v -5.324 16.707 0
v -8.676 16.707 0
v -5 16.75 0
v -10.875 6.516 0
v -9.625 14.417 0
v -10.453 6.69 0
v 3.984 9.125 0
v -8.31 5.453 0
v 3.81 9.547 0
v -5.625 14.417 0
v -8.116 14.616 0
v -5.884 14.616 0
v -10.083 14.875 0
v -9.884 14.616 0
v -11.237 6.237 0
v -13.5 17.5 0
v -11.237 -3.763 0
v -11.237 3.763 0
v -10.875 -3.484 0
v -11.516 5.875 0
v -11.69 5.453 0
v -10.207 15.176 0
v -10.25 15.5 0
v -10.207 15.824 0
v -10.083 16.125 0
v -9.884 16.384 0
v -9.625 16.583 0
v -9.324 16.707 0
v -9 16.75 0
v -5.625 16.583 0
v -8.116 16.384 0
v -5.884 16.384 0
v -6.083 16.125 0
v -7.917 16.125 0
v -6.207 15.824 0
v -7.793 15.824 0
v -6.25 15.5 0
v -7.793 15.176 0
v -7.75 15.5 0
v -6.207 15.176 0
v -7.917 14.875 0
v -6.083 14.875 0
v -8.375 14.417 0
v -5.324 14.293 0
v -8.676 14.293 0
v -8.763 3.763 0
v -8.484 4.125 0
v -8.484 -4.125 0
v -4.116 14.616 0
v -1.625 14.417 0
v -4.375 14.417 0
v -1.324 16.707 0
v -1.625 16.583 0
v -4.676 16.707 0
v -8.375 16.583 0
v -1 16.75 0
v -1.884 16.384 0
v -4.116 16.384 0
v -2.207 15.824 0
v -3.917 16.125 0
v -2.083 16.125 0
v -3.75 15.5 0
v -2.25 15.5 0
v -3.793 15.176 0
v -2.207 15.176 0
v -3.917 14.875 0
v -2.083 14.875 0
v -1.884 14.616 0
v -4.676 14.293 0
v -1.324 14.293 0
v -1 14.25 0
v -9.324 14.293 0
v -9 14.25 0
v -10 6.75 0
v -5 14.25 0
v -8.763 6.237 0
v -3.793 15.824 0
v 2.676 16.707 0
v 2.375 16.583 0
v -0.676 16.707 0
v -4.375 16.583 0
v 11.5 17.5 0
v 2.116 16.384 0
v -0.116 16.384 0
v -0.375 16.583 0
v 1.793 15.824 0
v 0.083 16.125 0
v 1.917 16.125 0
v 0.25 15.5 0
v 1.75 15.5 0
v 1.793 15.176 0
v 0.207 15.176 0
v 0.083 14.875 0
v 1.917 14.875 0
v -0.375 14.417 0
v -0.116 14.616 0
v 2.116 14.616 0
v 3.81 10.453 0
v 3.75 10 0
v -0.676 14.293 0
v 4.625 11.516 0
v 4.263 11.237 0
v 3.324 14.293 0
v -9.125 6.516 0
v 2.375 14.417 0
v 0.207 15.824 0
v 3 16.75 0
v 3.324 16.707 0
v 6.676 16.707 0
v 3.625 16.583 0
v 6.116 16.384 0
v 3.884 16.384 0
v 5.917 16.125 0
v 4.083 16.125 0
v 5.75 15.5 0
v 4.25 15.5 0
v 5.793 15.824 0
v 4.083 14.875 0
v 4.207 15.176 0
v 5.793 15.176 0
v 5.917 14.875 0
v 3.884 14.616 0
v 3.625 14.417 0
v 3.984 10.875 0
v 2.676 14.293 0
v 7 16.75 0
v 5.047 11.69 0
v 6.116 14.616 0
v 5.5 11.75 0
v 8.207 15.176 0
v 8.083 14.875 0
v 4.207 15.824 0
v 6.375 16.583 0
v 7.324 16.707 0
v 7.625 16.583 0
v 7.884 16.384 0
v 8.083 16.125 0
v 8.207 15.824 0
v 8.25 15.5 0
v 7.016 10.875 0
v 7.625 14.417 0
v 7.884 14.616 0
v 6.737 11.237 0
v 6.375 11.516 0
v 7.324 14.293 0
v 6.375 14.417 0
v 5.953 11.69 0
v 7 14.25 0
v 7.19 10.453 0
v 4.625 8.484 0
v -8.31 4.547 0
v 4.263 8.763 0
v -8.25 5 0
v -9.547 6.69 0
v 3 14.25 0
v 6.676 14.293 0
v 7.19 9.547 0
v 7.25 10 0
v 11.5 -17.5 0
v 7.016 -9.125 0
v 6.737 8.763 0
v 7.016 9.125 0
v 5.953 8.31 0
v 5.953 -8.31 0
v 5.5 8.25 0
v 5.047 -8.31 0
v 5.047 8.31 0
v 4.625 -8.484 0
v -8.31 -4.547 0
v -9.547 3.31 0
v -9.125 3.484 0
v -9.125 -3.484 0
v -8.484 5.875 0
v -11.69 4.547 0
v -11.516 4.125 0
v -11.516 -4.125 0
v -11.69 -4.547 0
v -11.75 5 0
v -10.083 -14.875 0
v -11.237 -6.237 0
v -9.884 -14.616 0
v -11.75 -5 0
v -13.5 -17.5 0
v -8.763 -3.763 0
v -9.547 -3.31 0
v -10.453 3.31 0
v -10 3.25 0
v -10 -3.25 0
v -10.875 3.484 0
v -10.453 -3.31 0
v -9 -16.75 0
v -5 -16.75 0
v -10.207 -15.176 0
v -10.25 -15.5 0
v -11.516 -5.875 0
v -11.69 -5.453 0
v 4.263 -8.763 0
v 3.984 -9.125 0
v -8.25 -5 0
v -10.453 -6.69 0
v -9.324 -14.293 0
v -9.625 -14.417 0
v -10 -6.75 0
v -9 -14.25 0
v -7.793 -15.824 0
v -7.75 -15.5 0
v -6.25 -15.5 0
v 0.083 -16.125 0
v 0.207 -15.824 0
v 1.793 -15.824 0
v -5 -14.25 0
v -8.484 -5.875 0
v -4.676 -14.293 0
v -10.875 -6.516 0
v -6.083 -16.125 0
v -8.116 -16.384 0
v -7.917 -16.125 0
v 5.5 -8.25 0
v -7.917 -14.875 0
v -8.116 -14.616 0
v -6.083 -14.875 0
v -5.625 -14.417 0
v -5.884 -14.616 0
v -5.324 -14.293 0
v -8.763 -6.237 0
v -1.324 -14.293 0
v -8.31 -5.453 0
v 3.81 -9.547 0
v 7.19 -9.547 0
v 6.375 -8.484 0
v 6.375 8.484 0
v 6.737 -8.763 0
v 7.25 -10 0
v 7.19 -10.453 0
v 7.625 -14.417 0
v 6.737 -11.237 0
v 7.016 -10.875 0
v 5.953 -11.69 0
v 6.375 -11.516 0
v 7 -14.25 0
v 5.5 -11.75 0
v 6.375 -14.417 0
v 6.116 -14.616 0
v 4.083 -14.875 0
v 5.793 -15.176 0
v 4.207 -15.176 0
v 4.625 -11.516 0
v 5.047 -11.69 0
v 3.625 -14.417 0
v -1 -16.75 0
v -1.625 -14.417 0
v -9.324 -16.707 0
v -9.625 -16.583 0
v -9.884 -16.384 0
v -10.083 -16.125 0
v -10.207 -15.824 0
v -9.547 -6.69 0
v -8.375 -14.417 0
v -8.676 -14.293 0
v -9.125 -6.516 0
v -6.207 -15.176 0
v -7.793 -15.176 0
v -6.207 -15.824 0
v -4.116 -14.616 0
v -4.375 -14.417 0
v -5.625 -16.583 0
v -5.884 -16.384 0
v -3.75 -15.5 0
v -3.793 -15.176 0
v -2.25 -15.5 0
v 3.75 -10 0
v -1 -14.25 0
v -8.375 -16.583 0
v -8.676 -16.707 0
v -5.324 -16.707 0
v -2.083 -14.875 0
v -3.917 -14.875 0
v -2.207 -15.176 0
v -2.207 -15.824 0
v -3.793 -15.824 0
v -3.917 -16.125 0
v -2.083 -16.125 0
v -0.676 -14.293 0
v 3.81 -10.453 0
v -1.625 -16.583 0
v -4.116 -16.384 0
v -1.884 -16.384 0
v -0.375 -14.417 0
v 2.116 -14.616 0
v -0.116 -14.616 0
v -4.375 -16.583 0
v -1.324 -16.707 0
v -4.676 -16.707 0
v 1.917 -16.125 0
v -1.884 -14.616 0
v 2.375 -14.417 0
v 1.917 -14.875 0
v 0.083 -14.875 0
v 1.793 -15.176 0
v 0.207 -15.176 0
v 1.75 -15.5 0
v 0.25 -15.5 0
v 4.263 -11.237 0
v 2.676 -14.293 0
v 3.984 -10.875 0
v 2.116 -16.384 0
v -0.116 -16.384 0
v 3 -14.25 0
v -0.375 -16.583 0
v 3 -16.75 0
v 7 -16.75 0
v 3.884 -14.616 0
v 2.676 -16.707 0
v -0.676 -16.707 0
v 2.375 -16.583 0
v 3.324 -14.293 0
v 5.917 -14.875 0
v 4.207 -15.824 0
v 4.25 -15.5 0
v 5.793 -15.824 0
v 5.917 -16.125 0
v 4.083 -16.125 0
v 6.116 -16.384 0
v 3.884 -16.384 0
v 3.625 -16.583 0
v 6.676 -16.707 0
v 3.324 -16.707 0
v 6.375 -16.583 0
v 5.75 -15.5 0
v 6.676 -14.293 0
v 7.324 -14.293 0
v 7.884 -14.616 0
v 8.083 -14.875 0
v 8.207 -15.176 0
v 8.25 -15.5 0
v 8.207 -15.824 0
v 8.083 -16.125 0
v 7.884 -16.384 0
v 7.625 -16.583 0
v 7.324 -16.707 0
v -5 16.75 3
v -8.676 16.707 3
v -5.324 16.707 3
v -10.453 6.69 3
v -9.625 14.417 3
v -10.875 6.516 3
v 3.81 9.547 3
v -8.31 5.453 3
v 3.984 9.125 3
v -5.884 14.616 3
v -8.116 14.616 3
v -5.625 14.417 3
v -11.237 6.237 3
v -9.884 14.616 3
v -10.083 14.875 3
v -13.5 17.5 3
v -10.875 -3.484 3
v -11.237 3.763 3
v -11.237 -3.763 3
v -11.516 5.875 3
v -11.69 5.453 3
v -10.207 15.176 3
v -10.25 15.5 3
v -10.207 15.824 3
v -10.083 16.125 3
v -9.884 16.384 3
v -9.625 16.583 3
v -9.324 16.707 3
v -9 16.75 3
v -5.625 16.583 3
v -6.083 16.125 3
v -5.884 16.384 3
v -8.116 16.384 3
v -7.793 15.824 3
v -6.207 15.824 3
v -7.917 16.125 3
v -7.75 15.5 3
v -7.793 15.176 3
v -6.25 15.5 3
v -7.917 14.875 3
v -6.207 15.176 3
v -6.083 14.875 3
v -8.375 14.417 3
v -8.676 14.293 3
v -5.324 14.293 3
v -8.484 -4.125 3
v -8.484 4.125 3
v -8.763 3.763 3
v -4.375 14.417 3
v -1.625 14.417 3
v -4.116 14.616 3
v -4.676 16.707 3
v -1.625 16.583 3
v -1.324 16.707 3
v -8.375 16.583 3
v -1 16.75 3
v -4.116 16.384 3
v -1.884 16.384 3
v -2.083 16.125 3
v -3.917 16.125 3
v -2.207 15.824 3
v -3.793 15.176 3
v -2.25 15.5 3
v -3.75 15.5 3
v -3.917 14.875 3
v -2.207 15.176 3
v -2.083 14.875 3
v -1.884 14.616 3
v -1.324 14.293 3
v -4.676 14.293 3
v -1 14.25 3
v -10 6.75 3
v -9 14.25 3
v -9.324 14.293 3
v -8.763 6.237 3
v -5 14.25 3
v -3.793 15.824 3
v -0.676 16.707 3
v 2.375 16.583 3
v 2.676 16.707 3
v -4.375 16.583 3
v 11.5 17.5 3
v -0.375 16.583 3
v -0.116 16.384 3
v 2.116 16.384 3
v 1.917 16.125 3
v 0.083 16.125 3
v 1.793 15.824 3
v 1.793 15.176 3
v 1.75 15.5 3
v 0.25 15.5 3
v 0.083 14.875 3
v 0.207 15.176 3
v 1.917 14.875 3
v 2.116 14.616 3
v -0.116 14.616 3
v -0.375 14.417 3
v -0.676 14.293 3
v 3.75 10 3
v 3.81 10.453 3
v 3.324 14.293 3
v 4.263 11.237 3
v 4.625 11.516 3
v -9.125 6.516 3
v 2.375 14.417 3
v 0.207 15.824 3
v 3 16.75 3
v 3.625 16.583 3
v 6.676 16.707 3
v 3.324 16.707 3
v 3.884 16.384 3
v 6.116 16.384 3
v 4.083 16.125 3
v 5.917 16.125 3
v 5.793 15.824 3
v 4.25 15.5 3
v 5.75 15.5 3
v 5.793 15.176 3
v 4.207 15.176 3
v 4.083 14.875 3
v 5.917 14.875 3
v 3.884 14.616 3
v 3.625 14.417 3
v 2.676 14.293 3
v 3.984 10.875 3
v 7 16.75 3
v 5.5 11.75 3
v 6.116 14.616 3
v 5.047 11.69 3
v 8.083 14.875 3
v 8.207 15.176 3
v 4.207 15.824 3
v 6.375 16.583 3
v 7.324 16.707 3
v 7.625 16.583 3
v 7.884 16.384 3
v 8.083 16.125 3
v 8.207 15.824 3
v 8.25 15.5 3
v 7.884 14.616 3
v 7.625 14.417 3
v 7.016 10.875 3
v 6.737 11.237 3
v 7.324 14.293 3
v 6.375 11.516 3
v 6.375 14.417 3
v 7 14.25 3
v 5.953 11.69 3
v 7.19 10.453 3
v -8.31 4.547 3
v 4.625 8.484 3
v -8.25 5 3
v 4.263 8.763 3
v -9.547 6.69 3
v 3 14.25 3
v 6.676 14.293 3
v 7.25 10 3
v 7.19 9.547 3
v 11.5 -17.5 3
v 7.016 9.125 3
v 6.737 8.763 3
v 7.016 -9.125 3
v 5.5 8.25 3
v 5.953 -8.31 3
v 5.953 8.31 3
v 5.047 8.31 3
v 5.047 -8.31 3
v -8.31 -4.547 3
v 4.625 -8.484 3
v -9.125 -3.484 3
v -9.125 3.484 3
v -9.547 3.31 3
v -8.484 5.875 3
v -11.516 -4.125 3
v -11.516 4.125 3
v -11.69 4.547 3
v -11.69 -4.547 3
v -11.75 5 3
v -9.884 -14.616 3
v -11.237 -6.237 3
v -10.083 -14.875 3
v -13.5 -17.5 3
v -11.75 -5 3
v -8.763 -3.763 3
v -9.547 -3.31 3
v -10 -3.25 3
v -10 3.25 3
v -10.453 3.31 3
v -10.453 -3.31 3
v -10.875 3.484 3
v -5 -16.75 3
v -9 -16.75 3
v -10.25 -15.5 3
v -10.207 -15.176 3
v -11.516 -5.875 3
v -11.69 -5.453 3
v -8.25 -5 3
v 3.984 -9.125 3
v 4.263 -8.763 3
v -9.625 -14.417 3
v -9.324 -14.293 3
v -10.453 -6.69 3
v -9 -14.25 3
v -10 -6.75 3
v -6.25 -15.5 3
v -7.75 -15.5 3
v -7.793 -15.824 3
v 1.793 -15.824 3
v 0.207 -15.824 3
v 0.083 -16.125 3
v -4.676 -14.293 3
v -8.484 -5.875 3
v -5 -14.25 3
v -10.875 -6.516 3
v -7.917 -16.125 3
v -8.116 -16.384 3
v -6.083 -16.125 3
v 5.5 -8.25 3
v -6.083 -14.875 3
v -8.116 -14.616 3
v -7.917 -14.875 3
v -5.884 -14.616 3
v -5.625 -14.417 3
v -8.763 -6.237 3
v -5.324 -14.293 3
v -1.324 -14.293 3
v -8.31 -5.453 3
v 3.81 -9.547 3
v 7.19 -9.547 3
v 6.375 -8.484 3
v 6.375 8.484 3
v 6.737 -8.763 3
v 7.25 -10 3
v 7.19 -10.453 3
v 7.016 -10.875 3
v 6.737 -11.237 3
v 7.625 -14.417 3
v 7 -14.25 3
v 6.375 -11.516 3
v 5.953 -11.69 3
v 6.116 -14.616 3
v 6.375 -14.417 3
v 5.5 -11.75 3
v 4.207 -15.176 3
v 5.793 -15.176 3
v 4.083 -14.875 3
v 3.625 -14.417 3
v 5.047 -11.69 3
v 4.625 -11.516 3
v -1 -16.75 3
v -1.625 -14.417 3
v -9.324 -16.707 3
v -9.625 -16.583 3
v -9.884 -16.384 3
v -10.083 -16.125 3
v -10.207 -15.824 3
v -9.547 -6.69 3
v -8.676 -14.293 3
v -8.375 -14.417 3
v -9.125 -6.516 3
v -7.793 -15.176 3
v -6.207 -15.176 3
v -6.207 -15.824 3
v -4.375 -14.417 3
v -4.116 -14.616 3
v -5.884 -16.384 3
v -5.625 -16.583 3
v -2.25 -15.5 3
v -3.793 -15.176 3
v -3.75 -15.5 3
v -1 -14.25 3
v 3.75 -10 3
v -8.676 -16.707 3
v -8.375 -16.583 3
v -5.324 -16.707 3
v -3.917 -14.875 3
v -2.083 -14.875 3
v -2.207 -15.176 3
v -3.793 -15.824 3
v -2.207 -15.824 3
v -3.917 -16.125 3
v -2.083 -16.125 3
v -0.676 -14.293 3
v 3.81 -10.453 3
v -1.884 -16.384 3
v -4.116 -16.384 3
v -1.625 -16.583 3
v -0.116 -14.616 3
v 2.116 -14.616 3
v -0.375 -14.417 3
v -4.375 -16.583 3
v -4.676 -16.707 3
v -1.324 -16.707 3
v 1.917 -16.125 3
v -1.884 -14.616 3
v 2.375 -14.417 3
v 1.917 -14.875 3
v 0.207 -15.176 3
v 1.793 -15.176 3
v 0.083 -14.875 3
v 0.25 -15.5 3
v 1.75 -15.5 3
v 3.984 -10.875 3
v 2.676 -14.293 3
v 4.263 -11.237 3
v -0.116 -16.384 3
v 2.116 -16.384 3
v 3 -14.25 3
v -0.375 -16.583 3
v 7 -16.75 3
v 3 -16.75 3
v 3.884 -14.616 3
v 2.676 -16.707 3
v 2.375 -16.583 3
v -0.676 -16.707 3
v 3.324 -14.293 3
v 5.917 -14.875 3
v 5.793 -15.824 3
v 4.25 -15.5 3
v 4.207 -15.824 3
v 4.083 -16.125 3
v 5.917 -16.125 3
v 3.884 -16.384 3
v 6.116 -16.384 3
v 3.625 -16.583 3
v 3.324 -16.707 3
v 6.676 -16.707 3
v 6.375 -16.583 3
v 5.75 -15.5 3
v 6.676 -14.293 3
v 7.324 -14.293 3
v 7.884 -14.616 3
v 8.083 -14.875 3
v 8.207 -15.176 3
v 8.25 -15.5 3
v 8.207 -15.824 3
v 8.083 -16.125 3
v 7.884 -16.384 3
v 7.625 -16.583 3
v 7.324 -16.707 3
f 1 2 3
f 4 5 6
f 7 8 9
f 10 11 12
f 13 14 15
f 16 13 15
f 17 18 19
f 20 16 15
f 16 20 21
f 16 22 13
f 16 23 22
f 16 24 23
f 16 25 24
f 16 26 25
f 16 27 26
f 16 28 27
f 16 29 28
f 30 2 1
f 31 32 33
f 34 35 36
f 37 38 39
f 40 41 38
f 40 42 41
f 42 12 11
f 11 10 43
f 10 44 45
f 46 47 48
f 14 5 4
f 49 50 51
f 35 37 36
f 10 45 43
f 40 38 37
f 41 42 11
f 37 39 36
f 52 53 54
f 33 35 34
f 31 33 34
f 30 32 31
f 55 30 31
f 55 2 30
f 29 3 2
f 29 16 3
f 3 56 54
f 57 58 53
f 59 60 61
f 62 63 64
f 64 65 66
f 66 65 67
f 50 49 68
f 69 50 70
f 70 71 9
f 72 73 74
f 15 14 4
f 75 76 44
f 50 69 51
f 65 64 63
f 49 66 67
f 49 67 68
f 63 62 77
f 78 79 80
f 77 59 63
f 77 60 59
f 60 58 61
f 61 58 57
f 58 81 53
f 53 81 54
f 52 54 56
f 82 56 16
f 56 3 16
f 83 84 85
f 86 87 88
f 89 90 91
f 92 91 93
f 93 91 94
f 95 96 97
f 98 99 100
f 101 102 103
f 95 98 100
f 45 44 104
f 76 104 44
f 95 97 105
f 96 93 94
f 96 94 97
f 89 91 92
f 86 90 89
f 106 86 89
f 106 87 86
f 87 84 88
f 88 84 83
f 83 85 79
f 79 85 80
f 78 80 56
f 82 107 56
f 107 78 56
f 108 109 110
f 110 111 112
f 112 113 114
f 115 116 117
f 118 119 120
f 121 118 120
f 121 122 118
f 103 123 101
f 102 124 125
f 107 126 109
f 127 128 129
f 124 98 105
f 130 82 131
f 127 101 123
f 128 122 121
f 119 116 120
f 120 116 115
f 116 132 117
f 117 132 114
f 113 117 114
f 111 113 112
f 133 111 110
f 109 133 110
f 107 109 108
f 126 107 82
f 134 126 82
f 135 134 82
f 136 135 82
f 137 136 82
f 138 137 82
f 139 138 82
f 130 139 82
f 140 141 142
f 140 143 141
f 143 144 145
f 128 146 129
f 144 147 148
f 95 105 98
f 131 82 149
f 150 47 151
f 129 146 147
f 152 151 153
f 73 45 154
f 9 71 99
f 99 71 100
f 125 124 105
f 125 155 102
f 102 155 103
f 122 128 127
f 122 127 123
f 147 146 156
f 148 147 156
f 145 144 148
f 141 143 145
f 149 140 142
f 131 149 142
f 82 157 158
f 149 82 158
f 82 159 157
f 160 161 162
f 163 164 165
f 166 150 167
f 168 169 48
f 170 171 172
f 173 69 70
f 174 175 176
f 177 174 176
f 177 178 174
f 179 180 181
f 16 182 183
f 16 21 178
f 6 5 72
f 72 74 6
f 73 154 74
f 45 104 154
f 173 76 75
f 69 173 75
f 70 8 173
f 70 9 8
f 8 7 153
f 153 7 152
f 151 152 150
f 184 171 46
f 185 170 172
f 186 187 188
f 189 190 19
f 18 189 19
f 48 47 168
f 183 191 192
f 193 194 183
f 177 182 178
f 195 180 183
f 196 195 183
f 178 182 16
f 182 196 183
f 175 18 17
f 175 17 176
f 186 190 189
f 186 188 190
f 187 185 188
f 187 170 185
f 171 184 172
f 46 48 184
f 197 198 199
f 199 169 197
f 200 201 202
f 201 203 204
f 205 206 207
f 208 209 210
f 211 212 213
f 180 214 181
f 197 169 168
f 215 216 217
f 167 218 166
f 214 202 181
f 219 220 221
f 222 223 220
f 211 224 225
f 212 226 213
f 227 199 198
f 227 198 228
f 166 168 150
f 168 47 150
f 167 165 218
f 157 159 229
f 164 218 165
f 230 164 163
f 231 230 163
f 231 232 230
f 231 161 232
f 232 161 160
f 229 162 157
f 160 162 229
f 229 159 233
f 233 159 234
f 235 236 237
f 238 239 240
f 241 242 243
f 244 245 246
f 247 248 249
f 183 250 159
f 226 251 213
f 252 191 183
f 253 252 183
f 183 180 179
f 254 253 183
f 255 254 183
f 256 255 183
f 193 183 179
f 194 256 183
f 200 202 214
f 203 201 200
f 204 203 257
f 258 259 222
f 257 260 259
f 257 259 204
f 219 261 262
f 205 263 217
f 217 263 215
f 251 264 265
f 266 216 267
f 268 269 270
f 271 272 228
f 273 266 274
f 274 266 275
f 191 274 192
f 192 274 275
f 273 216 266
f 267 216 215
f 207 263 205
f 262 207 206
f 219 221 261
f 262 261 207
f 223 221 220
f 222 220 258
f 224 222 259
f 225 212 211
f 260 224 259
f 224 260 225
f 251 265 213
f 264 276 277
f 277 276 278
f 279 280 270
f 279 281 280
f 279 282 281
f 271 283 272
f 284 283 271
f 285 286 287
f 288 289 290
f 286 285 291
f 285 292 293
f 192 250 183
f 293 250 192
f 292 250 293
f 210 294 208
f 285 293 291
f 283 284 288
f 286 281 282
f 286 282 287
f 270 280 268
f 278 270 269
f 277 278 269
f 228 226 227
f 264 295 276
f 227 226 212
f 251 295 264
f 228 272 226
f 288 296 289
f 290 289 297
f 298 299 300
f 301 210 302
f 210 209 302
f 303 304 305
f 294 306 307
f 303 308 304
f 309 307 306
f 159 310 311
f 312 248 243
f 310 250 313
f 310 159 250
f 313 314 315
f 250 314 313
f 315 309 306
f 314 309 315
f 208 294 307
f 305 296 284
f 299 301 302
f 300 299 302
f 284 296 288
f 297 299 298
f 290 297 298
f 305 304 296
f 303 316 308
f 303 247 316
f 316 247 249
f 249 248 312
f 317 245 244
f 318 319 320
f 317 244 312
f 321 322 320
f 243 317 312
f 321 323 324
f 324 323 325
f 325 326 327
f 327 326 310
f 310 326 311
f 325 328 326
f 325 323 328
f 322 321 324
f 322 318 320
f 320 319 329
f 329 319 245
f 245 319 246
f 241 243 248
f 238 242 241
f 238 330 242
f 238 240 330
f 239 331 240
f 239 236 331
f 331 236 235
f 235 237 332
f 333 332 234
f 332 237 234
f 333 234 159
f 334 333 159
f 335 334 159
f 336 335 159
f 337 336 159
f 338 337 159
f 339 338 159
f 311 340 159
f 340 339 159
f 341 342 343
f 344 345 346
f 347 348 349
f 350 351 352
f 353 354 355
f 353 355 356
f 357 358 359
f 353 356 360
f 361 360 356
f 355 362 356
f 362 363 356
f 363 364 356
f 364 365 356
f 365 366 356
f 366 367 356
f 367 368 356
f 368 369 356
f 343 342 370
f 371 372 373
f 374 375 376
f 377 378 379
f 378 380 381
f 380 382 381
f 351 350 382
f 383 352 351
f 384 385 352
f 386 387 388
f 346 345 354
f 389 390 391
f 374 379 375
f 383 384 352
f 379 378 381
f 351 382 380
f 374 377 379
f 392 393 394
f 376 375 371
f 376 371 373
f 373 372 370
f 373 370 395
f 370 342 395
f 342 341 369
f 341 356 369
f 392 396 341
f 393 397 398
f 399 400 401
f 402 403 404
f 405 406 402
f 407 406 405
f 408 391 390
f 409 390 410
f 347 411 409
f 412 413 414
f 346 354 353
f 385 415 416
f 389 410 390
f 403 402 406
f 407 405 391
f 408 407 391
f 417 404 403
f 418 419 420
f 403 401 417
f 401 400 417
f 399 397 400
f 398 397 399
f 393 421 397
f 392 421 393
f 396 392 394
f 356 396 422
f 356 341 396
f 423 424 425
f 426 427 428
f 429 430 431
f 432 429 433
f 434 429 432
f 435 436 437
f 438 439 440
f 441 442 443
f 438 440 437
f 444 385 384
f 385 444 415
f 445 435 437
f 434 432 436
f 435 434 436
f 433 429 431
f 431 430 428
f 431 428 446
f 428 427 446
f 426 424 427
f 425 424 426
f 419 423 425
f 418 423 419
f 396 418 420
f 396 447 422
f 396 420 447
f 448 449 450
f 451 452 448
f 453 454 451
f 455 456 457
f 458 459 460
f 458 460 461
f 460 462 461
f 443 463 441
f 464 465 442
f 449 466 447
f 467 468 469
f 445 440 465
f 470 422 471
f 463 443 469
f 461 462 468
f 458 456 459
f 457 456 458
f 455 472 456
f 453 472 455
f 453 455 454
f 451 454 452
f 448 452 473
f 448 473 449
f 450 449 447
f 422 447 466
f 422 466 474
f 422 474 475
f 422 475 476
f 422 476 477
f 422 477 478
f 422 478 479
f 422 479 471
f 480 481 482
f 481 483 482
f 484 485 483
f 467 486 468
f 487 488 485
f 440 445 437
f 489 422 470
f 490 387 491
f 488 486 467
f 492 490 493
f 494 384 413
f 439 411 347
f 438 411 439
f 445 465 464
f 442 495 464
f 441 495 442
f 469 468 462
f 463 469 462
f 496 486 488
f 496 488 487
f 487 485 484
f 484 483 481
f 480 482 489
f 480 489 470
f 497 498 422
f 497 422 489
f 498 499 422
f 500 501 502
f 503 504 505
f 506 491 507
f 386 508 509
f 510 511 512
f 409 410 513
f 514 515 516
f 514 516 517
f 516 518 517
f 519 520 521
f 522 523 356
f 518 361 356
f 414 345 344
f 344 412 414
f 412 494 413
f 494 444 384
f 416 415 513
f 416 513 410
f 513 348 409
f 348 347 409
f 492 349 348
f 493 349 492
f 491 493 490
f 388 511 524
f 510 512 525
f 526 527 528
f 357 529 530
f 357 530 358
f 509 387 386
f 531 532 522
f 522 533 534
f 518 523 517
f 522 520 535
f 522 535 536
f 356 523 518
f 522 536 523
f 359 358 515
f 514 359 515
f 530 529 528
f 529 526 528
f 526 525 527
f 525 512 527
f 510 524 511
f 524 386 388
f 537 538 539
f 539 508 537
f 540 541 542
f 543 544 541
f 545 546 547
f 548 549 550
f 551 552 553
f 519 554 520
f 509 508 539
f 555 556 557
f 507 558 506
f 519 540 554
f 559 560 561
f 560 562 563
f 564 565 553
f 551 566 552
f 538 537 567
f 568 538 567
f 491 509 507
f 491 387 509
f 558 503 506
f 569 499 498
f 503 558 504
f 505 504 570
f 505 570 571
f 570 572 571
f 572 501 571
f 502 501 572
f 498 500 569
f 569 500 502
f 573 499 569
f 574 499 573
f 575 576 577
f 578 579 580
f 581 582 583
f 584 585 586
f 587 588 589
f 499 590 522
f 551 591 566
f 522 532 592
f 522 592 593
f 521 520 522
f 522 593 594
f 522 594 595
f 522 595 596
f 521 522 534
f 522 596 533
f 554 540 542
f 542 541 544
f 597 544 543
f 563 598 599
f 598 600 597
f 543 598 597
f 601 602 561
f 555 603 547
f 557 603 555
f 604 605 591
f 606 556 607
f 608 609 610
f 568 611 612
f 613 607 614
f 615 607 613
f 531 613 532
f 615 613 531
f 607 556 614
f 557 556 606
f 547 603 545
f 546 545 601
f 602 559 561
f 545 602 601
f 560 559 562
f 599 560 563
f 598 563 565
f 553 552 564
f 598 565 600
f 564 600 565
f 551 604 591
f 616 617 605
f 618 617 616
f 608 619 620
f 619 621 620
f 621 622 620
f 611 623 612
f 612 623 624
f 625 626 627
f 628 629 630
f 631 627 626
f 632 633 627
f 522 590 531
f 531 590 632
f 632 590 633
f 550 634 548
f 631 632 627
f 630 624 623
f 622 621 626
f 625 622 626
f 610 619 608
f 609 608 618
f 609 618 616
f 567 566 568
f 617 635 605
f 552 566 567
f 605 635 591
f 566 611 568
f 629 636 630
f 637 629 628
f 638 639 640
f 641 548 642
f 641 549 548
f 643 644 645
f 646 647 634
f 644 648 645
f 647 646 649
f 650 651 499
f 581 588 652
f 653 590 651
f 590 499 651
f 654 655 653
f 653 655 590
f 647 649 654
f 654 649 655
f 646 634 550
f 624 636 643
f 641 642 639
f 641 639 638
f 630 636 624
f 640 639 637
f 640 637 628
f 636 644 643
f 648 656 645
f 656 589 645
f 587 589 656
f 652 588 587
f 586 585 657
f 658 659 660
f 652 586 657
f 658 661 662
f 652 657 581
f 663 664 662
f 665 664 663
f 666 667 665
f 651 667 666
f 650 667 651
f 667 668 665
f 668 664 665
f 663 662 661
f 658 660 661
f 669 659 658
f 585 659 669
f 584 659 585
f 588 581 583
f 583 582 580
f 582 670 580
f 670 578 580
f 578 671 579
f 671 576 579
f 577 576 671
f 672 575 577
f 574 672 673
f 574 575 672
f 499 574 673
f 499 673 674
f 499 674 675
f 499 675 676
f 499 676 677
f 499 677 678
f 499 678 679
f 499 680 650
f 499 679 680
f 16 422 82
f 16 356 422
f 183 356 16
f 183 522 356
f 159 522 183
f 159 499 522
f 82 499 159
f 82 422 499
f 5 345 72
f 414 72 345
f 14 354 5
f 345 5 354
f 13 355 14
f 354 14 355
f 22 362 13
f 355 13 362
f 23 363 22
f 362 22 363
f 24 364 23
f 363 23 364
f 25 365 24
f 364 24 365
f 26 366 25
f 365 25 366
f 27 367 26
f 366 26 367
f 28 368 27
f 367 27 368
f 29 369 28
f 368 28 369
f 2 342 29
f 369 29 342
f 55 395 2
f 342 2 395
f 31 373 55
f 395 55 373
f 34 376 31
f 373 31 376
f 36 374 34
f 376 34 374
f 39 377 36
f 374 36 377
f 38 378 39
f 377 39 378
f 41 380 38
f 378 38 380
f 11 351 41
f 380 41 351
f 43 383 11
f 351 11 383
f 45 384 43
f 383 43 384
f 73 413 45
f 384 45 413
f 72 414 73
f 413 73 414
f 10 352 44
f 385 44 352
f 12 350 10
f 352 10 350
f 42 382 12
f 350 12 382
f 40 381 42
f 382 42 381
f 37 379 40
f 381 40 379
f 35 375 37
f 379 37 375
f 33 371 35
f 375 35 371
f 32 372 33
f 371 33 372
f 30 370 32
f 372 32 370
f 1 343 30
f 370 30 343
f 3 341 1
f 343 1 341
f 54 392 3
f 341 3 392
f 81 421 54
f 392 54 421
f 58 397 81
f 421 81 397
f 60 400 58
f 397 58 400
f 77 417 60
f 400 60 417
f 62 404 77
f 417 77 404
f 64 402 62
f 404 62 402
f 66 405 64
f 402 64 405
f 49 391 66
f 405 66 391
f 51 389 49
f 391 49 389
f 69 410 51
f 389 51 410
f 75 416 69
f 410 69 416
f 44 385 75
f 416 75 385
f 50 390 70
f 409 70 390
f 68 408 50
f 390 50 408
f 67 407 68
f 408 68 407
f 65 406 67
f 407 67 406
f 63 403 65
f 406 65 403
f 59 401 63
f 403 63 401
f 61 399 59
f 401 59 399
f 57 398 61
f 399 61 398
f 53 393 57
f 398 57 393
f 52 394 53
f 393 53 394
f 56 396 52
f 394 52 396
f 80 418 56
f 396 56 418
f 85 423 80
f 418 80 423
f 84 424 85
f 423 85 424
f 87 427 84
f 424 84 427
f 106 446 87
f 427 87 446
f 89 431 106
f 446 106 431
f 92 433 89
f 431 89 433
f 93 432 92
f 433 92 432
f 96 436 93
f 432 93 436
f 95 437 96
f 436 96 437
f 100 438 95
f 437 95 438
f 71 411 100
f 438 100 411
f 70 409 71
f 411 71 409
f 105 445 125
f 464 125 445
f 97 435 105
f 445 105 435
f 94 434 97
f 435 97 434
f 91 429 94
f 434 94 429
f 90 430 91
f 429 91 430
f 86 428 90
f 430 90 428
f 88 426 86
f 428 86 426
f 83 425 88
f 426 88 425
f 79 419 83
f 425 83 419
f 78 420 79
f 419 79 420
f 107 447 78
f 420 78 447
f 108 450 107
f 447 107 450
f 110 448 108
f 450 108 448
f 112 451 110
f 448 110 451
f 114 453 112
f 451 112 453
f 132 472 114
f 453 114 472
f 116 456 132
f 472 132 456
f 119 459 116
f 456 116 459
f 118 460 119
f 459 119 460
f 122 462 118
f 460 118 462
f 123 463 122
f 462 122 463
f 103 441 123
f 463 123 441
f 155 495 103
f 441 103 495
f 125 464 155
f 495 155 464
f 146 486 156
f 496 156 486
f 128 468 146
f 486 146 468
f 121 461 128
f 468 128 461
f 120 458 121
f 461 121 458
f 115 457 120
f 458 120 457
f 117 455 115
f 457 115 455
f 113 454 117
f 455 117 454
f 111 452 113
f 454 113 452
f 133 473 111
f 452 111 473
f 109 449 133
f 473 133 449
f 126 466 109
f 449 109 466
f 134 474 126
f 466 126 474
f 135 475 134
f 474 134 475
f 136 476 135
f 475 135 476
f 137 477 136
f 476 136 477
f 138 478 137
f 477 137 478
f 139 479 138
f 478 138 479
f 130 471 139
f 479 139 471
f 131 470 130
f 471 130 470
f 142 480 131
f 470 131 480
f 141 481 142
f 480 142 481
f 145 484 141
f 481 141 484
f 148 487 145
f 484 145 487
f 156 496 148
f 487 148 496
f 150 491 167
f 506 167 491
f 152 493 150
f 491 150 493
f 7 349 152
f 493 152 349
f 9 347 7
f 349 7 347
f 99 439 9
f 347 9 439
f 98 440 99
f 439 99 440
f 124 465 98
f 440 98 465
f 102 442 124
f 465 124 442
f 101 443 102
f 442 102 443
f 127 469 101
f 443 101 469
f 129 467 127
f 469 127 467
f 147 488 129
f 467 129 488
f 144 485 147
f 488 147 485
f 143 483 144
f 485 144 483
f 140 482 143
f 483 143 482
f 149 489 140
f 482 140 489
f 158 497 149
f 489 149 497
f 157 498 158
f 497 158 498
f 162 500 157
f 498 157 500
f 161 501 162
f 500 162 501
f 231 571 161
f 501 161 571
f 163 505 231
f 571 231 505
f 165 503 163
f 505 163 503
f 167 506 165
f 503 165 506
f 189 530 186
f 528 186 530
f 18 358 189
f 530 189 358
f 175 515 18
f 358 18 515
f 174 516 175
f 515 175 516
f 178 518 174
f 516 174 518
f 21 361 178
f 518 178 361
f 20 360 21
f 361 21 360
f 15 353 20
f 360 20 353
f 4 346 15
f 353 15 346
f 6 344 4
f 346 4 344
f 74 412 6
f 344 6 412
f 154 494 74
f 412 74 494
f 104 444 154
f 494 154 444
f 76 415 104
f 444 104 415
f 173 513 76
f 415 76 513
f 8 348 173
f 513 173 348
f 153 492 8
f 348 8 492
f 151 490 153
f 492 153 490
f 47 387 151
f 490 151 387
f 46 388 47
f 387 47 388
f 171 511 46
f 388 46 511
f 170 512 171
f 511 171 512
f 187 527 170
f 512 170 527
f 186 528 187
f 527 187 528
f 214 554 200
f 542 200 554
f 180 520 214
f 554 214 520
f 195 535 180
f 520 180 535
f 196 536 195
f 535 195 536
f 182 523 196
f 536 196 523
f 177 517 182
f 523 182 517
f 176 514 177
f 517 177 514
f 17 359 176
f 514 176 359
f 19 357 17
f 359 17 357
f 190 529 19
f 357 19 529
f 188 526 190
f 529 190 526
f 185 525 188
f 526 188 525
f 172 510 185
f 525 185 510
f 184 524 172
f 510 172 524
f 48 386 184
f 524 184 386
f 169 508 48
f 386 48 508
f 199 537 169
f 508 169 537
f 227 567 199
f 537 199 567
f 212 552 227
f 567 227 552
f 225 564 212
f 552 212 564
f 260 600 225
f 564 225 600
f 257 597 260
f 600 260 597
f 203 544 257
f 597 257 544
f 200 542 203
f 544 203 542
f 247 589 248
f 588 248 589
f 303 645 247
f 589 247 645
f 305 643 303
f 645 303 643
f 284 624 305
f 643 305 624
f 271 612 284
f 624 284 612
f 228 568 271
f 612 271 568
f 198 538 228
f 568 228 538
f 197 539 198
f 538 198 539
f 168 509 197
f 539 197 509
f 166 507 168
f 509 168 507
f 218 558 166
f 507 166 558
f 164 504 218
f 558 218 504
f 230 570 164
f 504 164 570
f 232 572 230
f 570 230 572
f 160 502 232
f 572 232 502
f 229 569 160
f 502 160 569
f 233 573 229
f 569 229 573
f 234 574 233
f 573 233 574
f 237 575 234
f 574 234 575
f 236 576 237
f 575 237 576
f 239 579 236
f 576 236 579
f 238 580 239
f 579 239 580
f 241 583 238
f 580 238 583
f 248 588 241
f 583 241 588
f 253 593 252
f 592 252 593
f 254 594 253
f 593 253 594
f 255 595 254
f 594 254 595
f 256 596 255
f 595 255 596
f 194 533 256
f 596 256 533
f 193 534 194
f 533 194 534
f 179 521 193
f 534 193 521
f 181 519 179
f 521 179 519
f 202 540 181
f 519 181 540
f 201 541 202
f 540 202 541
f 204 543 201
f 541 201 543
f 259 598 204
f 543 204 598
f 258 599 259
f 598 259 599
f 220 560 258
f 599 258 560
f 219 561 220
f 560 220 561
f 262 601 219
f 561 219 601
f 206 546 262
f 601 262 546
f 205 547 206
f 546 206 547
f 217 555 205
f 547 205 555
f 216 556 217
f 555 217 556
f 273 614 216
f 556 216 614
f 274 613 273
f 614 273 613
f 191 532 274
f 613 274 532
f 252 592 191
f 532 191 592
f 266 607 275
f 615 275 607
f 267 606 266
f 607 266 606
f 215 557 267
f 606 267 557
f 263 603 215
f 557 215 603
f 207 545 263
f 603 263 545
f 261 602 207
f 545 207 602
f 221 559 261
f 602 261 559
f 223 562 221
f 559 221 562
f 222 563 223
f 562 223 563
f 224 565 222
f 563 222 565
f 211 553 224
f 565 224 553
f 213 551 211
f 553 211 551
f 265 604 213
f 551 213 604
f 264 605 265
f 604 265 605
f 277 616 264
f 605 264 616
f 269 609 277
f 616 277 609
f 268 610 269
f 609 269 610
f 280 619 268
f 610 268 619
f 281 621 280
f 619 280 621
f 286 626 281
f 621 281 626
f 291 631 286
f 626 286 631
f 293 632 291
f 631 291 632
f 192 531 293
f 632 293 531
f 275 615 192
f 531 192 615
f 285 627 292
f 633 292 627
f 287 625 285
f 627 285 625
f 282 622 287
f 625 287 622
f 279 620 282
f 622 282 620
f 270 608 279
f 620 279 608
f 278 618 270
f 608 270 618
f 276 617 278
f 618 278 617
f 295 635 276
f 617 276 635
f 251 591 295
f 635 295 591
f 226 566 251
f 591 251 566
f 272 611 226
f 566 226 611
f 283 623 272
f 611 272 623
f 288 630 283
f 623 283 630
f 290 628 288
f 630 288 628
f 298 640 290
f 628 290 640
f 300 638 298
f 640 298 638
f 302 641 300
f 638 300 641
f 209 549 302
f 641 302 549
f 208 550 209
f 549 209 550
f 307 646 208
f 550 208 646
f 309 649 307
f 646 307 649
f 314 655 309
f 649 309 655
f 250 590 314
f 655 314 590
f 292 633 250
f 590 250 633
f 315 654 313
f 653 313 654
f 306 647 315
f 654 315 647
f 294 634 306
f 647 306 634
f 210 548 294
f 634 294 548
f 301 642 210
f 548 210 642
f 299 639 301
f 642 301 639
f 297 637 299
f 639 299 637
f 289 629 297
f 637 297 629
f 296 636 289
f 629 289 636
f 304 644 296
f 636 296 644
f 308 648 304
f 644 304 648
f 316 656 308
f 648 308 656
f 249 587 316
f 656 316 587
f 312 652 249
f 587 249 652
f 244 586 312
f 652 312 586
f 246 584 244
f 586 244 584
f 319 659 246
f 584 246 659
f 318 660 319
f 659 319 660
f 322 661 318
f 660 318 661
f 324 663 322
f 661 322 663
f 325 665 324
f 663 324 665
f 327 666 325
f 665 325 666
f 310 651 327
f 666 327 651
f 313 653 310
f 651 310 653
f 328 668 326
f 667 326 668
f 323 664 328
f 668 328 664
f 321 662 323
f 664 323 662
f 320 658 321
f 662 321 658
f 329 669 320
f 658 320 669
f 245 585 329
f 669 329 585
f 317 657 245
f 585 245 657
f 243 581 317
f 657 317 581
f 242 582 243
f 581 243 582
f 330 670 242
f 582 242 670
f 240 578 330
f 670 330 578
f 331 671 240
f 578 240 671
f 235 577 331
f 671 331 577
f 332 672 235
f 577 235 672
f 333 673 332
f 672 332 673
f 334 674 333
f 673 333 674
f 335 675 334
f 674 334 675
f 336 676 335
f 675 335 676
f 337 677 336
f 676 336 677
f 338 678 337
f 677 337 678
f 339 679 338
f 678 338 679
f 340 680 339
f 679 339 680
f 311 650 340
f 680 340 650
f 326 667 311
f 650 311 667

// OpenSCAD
imu_space = 20;
$fn = 24;

// Actual IMU:
%difference(){
	square([16,27],center=true);
	translate([5.5,0])for(y=[-1:2:1])scale([1,y])translate([0,imu_space/2])circle(d=3.5);
}

linear_extrude(3)difference(){
	
	translate([-1,0])square([25,35],center=true);

	for(y=[-1:2:1])scale([1,y])for(x=[-9:4:9])translate([x,15.5])circle(d=2.5);

	// Screwholes:
	translate([5.5,0])for(y=[-1:2:1])scale([1,y])translate([0,imu_space/2])circle(d=3.5);

	// Strain relief:
	translate([-10,0])for(y=[-1:2:1])scale([1,y])translate([0,5])circle(d=3.5);
}
